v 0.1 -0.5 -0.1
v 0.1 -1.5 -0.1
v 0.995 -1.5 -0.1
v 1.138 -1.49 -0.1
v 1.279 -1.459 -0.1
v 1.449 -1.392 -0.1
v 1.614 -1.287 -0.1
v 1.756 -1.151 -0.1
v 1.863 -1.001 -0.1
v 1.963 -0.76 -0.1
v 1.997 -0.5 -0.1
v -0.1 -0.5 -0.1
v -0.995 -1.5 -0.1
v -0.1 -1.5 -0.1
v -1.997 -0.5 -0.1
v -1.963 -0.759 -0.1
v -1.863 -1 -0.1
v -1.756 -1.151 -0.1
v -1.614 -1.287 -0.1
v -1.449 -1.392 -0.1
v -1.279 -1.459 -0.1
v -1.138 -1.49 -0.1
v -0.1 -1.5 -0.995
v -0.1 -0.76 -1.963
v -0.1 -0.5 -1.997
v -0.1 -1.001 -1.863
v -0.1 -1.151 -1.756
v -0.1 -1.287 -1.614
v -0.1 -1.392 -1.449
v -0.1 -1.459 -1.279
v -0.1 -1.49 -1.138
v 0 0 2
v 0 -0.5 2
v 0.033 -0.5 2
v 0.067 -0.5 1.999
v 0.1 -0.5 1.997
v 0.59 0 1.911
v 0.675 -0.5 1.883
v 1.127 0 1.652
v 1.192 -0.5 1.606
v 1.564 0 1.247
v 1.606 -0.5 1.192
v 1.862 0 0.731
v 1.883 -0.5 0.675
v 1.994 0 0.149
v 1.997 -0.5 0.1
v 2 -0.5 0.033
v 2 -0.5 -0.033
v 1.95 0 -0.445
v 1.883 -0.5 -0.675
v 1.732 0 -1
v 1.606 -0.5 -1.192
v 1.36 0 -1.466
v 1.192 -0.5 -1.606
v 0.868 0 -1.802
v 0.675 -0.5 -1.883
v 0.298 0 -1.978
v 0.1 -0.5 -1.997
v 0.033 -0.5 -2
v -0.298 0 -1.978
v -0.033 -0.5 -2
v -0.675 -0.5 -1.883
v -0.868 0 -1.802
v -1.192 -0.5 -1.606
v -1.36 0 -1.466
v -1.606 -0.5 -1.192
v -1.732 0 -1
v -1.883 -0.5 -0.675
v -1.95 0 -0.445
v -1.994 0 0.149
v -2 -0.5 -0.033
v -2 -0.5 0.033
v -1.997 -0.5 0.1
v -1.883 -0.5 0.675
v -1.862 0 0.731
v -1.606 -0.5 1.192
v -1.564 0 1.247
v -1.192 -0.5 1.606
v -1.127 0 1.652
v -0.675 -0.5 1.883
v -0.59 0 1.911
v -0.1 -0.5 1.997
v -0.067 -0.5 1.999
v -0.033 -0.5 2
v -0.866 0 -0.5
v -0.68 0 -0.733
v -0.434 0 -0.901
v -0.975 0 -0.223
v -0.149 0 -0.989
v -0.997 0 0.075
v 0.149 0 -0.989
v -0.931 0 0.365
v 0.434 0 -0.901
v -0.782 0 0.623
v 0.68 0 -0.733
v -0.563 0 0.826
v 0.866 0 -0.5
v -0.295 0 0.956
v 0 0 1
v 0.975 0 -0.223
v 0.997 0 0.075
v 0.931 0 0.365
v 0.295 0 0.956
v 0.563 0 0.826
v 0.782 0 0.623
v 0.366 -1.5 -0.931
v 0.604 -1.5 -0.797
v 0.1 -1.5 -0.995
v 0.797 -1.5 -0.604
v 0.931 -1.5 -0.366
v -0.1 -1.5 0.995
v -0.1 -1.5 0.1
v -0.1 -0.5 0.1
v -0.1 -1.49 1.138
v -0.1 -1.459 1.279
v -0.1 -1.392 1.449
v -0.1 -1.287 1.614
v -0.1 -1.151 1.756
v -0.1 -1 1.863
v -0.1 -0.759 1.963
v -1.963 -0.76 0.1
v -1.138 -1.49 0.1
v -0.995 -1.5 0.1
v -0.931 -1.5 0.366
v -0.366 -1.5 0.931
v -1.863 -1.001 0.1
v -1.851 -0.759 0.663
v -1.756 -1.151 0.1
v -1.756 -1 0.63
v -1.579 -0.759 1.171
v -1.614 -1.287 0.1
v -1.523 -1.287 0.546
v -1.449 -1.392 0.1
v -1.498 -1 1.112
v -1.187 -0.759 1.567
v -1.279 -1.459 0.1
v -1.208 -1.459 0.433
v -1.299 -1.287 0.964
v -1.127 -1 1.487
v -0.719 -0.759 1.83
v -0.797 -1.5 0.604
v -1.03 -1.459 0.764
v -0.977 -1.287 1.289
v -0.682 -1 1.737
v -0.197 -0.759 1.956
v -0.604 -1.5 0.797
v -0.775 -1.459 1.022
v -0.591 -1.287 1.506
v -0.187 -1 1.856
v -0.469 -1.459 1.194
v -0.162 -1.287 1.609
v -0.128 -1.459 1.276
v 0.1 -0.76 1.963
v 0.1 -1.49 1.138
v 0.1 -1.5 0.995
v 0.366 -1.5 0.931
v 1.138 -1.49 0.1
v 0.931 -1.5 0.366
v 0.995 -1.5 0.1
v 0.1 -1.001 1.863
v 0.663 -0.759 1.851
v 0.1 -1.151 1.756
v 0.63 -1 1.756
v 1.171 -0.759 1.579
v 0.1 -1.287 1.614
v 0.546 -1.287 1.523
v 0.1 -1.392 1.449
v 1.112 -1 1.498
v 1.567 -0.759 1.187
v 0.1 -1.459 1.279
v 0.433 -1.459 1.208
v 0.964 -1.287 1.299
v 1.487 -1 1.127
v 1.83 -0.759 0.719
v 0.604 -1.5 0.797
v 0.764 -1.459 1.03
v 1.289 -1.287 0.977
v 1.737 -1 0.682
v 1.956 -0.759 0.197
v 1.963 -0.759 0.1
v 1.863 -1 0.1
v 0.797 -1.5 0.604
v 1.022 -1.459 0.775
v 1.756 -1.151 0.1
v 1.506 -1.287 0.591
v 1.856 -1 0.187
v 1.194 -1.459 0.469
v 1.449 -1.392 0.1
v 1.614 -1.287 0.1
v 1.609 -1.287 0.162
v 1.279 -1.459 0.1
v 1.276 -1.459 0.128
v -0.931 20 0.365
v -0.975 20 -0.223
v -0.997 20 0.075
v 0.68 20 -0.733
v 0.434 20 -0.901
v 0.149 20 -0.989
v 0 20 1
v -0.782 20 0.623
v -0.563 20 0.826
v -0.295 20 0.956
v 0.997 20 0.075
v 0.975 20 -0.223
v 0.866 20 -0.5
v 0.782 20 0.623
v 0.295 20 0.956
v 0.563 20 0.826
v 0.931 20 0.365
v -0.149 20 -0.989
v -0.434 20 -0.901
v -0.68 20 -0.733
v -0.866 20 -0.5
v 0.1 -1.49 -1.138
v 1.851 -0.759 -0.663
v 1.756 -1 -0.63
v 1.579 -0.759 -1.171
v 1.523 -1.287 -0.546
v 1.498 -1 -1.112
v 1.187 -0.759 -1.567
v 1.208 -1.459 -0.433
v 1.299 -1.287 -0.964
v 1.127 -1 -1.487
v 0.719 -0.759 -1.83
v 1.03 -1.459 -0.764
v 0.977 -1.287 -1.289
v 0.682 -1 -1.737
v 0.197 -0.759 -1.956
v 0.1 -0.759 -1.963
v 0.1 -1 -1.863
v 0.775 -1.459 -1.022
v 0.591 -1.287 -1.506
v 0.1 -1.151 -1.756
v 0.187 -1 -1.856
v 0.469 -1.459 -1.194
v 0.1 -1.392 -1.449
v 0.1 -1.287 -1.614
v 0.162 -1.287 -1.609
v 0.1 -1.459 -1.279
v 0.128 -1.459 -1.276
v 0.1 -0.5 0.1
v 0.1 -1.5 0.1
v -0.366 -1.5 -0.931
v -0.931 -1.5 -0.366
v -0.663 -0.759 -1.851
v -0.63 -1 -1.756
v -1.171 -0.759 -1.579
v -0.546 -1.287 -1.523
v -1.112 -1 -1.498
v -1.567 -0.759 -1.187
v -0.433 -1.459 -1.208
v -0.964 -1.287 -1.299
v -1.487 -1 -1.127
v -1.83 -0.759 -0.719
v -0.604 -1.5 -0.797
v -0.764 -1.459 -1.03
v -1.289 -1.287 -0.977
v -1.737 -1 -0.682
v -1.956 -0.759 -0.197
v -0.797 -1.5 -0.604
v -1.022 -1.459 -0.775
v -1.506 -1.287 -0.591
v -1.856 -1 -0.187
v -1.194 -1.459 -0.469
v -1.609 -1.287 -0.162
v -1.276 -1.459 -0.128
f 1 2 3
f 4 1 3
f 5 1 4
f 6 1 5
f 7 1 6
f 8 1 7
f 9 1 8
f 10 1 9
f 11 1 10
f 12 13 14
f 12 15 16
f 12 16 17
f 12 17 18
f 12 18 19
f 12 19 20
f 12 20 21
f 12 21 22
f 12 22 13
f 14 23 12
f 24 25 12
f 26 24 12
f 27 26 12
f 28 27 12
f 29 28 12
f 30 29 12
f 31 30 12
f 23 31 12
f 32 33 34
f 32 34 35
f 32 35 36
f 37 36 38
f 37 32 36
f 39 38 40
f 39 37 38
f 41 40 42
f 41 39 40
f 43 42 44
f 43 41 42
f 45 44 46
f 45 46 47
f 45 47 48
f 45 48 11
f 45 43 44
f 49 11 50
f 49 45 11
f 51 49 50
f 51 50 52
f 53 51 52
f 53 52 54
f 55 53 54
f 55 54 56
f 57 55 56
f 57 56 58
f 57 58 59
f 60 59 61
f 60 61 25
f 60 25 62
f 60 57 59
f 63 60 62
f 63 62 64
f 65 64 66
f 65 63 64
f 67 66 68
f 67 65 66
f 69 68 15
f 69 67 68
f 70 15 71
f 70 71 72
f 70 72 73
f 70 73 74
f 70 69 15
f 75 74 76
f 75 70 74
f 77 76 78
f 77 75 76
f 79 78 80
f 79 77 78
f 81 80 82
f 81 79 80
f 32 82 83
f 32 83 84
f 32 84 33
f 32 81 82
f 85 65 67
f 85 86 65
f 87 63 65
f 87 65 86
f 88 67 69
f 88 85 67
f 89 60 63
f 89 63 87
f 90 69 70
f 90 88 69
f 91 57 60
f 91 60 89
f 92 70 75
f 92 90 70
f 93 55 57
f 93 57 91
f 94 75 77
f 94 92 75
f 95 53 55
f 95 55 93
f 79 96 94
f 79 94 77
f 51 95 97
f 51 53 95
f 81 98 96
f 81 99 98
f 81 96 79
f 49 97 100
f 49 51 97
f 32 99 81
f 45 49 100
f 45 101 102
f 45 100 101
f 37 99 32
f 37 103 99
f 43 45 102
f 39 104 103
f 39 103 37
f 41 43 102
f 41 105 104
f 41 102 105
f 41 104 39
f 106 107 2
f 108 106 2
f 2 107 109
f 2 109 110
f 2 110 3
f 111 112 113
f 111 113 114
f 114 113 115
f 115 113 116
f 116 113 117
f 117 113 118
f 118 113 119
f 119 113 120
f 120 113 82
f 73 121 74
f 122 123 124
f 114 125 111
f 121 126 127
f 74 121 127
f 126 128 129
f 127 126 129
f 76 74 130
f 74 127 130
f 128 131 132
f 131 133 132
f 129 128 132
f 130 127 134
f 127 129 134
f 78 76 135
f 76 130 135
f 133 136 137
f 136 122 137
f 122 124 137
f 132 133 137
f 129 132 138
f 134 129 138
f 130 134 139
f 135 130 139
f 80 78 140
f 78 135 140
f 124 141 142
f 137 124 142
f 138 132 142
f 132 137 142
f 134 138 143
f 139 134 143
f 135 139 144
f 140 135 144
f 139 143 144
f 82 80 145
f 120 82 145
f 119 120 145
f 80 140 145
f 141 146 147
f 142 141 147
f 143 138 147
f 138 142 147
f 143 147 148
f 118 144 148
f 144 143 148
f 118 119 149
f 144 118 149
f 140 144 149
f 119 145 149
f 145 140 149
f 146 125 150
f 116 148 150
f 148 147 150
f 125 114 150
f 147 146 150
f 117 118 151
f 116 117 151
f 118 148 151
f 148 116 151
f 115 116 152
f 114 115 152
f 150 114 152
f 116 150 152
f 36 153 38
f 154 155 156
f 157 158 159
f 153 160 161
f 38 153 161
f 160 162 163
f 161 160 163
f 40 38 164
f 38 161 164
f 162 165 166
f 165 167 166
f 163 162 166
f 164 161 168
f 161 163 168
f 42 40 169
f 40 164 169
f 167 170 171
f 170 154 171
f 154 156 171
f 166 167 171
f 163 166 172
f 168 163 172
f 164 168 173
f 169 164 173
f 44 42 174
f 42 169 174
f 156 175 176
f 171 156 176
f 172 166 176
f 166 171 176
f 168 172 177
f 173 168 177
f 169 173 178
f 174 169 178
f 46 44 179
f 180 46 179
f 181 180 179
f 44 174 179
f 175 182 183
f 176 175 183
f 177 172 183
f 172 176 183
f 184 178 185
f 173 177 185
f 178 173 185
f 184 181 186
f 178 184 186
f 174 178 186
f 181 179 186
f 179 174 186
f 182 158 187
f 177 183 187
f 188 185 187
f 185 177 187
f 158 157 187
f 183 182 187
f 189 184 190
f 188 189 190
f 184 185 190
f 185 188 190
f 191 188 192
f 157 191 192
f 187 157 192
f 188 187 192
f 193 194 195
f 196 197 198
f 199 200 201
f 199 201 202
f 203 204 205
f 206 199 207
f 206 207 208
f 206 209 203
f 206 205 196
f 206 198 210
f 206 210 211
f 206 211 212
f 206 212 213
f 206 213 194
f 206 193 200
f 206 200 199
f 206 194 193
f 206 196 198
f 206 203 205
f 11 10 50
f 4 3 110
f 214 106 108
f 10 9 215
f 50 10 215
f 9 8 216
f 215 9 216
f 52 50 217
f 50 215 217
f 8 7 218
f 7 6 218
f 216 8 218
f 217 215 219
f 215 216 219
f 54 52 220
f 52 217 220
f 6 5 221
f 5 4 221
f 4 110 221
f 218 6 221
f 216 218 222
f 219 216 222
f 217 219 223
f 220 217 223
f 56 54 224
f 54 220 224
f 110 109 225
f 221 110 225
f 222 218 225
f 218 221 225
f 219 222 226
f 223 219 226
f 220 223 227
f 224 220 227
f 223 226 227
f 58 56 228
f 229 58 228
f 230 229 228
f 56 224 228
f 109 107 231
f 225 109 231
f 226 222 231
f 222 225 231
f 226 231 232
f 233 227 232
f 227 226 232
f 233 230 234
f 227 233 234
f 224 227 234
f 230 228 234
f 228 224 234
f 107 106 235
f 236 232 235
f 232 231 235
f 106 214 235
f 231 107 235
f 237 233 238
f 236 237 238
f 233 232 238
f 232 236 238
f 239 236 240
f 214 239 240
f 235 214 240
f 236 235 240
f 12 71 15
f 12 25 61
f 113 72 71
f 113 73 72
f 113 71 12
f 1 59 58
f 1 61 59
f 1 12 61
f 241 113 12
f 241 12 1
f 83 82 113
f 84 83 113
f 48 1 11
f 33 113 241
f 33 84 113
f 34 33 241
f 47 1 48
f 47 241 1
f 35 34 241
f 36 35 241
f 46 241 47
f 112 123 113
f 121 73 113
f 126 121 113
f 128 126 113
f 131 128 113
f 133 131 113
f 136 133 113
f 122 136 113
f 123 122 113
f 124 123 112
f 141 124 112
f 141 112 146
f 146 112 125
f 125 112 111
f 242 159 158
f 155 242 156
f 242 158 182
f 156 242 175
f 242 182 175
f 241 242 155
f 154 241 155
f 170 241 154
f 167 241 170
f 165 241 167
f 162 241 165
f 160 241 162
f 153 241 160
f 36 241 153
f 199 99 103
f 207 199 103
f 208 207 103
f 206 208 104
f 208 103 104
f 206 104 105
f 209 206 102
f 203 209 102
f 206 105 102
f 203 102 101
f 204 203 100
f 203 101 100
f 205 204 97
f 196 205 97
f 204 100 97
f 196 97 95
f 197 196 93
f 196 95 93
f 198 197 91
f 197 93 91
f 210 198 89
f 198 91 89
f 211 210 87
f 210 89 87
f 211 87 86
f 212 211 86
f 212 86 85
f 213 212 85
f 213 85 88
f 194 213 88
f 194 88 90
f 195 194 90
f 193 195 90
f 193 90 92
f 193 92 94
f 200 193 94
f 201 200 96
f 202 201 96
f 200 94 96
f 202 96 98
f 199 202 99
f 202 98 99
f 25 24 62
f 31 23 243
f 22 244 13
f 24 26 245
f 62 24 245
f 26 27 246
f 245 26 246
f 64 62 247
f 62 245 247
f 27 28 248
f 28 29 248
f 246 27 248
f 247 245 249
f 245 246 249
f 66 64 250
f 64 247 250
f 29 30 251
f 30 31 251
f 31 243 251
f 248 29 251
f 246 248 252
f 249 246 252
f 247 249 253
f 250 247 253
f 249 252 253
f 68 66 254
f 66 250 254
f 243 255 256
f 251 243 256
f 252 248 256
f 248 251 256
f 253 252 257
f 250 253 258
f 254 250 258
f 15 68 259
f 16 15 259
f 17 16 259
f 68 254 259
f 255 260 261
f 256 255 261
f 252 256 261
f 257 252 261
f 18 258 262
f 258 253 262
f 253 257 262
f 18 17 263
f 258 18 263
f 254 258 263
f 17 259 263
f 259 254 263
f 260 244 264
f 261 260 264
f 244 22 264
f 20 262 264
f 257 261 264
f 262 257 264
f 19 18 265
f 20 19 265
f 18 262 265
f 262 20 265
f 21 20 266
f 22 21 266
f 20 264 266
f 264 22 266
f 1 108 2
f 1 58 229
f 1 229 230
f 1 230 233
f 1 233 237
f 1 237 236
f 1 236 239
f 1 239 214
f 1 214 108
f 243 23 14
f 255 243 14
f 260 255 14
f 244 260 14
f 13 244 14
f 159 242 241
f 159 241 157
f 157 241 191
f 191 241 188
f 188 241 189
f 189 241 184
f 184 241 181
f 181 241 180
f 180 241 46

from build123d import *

# Parameters (mm, degrees)
SKETCH_1_R               = 2
EXTRUDE_1_DEPTH          = 1.5
SKETCH_2_R               = 1
EXTRUDE_2_DEPTH          = 20
CUT_EXTRUDE_1_DEPTH      = 22.685248442
CUT_EXTRUDE_1_DEPTH_BACK = 1
SKETCH_4_W               = 4
SKETCH_4_H               = 0.2
SKETCH_4_W_2             = 0.2
SKETCH_4_H_2             = 4
FILLET_1_R               = 1


with BuildPart() as part:
    # 草图1 → 凸台-拉伸1 (new body)
    with BuildSketch(Plane(origin=(0, 0, 0), x_dir=(1, 0, 0), z_dir=(0, 1, 0))):
        Circle(SKETCH_1_R)
    extrude(amount=-EXTRUDE_1_DEPTH)

    # 草图2 → 凸台-拉伸2 (add)
    with BuildSketch(Plane(origin=(0, 0, 0), x_dir=(1, 0, 0), z_dir=(0, 1, 0))):
        Circle(SKETCH_2_R)
    extrude(amount=EXTRUDE_2_DEPTH)

    # 草图4 → 切除-拉伸-薄壁1 (cut, two sides: drawn at the far end of the back side and taken through both)
    with BuildSketch(Plane.XZ.offset(1.5).offset(-CUT_EXTRUDE_1_DEPTH_BACK)):
        Rectangle(SKETCH_4_W, SKETCH_4_H)
        Rectangle(SKETCH_4_W_2, SKETCH_4_H_2)
    extrude(amount=CUT_EXTRUDE_1_DEPTH + CUT_EXTRUDE_1_DEPTH_BACK, mode=Mode.SUBTRACT)

    # 圆角1
    fillet_1_edges = [part.edges().sort_by_distance(p)[0] for p in [
        (1.414213562, -1.5, 1.414213562),
        (-1.414213562, -1.5, 1.414213562),
        (-1.414213562, -1.5, -1.414213562),
        (1.414213562, -1.5, -1.414213562),
    ]]
    fillet(fillet_1_edges, radius=FILLET_1_R)


solid = part.part
